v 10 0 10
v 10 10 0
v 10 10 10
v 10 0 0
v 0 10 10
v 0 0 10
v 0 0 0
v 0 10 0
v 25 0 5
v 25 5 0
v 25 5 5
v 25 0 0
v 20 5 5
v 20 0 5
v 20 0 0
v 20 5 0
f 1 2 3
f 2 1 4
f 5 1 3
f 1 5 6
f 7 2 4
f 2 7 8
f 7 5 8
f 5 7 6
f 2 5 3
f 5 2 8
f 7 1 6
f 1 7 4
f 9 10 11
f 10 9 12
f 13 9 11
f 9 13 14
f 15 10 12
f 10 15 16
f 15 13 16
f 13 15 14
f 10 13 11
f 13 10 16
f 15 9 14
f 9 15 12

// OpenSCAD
// Colours written the two other ways a model can write them: a CSS name and a vector.
color("Red") cube(10);
color([0, 0.5, 1]) translate([20, 0, 0]) cube(5);
